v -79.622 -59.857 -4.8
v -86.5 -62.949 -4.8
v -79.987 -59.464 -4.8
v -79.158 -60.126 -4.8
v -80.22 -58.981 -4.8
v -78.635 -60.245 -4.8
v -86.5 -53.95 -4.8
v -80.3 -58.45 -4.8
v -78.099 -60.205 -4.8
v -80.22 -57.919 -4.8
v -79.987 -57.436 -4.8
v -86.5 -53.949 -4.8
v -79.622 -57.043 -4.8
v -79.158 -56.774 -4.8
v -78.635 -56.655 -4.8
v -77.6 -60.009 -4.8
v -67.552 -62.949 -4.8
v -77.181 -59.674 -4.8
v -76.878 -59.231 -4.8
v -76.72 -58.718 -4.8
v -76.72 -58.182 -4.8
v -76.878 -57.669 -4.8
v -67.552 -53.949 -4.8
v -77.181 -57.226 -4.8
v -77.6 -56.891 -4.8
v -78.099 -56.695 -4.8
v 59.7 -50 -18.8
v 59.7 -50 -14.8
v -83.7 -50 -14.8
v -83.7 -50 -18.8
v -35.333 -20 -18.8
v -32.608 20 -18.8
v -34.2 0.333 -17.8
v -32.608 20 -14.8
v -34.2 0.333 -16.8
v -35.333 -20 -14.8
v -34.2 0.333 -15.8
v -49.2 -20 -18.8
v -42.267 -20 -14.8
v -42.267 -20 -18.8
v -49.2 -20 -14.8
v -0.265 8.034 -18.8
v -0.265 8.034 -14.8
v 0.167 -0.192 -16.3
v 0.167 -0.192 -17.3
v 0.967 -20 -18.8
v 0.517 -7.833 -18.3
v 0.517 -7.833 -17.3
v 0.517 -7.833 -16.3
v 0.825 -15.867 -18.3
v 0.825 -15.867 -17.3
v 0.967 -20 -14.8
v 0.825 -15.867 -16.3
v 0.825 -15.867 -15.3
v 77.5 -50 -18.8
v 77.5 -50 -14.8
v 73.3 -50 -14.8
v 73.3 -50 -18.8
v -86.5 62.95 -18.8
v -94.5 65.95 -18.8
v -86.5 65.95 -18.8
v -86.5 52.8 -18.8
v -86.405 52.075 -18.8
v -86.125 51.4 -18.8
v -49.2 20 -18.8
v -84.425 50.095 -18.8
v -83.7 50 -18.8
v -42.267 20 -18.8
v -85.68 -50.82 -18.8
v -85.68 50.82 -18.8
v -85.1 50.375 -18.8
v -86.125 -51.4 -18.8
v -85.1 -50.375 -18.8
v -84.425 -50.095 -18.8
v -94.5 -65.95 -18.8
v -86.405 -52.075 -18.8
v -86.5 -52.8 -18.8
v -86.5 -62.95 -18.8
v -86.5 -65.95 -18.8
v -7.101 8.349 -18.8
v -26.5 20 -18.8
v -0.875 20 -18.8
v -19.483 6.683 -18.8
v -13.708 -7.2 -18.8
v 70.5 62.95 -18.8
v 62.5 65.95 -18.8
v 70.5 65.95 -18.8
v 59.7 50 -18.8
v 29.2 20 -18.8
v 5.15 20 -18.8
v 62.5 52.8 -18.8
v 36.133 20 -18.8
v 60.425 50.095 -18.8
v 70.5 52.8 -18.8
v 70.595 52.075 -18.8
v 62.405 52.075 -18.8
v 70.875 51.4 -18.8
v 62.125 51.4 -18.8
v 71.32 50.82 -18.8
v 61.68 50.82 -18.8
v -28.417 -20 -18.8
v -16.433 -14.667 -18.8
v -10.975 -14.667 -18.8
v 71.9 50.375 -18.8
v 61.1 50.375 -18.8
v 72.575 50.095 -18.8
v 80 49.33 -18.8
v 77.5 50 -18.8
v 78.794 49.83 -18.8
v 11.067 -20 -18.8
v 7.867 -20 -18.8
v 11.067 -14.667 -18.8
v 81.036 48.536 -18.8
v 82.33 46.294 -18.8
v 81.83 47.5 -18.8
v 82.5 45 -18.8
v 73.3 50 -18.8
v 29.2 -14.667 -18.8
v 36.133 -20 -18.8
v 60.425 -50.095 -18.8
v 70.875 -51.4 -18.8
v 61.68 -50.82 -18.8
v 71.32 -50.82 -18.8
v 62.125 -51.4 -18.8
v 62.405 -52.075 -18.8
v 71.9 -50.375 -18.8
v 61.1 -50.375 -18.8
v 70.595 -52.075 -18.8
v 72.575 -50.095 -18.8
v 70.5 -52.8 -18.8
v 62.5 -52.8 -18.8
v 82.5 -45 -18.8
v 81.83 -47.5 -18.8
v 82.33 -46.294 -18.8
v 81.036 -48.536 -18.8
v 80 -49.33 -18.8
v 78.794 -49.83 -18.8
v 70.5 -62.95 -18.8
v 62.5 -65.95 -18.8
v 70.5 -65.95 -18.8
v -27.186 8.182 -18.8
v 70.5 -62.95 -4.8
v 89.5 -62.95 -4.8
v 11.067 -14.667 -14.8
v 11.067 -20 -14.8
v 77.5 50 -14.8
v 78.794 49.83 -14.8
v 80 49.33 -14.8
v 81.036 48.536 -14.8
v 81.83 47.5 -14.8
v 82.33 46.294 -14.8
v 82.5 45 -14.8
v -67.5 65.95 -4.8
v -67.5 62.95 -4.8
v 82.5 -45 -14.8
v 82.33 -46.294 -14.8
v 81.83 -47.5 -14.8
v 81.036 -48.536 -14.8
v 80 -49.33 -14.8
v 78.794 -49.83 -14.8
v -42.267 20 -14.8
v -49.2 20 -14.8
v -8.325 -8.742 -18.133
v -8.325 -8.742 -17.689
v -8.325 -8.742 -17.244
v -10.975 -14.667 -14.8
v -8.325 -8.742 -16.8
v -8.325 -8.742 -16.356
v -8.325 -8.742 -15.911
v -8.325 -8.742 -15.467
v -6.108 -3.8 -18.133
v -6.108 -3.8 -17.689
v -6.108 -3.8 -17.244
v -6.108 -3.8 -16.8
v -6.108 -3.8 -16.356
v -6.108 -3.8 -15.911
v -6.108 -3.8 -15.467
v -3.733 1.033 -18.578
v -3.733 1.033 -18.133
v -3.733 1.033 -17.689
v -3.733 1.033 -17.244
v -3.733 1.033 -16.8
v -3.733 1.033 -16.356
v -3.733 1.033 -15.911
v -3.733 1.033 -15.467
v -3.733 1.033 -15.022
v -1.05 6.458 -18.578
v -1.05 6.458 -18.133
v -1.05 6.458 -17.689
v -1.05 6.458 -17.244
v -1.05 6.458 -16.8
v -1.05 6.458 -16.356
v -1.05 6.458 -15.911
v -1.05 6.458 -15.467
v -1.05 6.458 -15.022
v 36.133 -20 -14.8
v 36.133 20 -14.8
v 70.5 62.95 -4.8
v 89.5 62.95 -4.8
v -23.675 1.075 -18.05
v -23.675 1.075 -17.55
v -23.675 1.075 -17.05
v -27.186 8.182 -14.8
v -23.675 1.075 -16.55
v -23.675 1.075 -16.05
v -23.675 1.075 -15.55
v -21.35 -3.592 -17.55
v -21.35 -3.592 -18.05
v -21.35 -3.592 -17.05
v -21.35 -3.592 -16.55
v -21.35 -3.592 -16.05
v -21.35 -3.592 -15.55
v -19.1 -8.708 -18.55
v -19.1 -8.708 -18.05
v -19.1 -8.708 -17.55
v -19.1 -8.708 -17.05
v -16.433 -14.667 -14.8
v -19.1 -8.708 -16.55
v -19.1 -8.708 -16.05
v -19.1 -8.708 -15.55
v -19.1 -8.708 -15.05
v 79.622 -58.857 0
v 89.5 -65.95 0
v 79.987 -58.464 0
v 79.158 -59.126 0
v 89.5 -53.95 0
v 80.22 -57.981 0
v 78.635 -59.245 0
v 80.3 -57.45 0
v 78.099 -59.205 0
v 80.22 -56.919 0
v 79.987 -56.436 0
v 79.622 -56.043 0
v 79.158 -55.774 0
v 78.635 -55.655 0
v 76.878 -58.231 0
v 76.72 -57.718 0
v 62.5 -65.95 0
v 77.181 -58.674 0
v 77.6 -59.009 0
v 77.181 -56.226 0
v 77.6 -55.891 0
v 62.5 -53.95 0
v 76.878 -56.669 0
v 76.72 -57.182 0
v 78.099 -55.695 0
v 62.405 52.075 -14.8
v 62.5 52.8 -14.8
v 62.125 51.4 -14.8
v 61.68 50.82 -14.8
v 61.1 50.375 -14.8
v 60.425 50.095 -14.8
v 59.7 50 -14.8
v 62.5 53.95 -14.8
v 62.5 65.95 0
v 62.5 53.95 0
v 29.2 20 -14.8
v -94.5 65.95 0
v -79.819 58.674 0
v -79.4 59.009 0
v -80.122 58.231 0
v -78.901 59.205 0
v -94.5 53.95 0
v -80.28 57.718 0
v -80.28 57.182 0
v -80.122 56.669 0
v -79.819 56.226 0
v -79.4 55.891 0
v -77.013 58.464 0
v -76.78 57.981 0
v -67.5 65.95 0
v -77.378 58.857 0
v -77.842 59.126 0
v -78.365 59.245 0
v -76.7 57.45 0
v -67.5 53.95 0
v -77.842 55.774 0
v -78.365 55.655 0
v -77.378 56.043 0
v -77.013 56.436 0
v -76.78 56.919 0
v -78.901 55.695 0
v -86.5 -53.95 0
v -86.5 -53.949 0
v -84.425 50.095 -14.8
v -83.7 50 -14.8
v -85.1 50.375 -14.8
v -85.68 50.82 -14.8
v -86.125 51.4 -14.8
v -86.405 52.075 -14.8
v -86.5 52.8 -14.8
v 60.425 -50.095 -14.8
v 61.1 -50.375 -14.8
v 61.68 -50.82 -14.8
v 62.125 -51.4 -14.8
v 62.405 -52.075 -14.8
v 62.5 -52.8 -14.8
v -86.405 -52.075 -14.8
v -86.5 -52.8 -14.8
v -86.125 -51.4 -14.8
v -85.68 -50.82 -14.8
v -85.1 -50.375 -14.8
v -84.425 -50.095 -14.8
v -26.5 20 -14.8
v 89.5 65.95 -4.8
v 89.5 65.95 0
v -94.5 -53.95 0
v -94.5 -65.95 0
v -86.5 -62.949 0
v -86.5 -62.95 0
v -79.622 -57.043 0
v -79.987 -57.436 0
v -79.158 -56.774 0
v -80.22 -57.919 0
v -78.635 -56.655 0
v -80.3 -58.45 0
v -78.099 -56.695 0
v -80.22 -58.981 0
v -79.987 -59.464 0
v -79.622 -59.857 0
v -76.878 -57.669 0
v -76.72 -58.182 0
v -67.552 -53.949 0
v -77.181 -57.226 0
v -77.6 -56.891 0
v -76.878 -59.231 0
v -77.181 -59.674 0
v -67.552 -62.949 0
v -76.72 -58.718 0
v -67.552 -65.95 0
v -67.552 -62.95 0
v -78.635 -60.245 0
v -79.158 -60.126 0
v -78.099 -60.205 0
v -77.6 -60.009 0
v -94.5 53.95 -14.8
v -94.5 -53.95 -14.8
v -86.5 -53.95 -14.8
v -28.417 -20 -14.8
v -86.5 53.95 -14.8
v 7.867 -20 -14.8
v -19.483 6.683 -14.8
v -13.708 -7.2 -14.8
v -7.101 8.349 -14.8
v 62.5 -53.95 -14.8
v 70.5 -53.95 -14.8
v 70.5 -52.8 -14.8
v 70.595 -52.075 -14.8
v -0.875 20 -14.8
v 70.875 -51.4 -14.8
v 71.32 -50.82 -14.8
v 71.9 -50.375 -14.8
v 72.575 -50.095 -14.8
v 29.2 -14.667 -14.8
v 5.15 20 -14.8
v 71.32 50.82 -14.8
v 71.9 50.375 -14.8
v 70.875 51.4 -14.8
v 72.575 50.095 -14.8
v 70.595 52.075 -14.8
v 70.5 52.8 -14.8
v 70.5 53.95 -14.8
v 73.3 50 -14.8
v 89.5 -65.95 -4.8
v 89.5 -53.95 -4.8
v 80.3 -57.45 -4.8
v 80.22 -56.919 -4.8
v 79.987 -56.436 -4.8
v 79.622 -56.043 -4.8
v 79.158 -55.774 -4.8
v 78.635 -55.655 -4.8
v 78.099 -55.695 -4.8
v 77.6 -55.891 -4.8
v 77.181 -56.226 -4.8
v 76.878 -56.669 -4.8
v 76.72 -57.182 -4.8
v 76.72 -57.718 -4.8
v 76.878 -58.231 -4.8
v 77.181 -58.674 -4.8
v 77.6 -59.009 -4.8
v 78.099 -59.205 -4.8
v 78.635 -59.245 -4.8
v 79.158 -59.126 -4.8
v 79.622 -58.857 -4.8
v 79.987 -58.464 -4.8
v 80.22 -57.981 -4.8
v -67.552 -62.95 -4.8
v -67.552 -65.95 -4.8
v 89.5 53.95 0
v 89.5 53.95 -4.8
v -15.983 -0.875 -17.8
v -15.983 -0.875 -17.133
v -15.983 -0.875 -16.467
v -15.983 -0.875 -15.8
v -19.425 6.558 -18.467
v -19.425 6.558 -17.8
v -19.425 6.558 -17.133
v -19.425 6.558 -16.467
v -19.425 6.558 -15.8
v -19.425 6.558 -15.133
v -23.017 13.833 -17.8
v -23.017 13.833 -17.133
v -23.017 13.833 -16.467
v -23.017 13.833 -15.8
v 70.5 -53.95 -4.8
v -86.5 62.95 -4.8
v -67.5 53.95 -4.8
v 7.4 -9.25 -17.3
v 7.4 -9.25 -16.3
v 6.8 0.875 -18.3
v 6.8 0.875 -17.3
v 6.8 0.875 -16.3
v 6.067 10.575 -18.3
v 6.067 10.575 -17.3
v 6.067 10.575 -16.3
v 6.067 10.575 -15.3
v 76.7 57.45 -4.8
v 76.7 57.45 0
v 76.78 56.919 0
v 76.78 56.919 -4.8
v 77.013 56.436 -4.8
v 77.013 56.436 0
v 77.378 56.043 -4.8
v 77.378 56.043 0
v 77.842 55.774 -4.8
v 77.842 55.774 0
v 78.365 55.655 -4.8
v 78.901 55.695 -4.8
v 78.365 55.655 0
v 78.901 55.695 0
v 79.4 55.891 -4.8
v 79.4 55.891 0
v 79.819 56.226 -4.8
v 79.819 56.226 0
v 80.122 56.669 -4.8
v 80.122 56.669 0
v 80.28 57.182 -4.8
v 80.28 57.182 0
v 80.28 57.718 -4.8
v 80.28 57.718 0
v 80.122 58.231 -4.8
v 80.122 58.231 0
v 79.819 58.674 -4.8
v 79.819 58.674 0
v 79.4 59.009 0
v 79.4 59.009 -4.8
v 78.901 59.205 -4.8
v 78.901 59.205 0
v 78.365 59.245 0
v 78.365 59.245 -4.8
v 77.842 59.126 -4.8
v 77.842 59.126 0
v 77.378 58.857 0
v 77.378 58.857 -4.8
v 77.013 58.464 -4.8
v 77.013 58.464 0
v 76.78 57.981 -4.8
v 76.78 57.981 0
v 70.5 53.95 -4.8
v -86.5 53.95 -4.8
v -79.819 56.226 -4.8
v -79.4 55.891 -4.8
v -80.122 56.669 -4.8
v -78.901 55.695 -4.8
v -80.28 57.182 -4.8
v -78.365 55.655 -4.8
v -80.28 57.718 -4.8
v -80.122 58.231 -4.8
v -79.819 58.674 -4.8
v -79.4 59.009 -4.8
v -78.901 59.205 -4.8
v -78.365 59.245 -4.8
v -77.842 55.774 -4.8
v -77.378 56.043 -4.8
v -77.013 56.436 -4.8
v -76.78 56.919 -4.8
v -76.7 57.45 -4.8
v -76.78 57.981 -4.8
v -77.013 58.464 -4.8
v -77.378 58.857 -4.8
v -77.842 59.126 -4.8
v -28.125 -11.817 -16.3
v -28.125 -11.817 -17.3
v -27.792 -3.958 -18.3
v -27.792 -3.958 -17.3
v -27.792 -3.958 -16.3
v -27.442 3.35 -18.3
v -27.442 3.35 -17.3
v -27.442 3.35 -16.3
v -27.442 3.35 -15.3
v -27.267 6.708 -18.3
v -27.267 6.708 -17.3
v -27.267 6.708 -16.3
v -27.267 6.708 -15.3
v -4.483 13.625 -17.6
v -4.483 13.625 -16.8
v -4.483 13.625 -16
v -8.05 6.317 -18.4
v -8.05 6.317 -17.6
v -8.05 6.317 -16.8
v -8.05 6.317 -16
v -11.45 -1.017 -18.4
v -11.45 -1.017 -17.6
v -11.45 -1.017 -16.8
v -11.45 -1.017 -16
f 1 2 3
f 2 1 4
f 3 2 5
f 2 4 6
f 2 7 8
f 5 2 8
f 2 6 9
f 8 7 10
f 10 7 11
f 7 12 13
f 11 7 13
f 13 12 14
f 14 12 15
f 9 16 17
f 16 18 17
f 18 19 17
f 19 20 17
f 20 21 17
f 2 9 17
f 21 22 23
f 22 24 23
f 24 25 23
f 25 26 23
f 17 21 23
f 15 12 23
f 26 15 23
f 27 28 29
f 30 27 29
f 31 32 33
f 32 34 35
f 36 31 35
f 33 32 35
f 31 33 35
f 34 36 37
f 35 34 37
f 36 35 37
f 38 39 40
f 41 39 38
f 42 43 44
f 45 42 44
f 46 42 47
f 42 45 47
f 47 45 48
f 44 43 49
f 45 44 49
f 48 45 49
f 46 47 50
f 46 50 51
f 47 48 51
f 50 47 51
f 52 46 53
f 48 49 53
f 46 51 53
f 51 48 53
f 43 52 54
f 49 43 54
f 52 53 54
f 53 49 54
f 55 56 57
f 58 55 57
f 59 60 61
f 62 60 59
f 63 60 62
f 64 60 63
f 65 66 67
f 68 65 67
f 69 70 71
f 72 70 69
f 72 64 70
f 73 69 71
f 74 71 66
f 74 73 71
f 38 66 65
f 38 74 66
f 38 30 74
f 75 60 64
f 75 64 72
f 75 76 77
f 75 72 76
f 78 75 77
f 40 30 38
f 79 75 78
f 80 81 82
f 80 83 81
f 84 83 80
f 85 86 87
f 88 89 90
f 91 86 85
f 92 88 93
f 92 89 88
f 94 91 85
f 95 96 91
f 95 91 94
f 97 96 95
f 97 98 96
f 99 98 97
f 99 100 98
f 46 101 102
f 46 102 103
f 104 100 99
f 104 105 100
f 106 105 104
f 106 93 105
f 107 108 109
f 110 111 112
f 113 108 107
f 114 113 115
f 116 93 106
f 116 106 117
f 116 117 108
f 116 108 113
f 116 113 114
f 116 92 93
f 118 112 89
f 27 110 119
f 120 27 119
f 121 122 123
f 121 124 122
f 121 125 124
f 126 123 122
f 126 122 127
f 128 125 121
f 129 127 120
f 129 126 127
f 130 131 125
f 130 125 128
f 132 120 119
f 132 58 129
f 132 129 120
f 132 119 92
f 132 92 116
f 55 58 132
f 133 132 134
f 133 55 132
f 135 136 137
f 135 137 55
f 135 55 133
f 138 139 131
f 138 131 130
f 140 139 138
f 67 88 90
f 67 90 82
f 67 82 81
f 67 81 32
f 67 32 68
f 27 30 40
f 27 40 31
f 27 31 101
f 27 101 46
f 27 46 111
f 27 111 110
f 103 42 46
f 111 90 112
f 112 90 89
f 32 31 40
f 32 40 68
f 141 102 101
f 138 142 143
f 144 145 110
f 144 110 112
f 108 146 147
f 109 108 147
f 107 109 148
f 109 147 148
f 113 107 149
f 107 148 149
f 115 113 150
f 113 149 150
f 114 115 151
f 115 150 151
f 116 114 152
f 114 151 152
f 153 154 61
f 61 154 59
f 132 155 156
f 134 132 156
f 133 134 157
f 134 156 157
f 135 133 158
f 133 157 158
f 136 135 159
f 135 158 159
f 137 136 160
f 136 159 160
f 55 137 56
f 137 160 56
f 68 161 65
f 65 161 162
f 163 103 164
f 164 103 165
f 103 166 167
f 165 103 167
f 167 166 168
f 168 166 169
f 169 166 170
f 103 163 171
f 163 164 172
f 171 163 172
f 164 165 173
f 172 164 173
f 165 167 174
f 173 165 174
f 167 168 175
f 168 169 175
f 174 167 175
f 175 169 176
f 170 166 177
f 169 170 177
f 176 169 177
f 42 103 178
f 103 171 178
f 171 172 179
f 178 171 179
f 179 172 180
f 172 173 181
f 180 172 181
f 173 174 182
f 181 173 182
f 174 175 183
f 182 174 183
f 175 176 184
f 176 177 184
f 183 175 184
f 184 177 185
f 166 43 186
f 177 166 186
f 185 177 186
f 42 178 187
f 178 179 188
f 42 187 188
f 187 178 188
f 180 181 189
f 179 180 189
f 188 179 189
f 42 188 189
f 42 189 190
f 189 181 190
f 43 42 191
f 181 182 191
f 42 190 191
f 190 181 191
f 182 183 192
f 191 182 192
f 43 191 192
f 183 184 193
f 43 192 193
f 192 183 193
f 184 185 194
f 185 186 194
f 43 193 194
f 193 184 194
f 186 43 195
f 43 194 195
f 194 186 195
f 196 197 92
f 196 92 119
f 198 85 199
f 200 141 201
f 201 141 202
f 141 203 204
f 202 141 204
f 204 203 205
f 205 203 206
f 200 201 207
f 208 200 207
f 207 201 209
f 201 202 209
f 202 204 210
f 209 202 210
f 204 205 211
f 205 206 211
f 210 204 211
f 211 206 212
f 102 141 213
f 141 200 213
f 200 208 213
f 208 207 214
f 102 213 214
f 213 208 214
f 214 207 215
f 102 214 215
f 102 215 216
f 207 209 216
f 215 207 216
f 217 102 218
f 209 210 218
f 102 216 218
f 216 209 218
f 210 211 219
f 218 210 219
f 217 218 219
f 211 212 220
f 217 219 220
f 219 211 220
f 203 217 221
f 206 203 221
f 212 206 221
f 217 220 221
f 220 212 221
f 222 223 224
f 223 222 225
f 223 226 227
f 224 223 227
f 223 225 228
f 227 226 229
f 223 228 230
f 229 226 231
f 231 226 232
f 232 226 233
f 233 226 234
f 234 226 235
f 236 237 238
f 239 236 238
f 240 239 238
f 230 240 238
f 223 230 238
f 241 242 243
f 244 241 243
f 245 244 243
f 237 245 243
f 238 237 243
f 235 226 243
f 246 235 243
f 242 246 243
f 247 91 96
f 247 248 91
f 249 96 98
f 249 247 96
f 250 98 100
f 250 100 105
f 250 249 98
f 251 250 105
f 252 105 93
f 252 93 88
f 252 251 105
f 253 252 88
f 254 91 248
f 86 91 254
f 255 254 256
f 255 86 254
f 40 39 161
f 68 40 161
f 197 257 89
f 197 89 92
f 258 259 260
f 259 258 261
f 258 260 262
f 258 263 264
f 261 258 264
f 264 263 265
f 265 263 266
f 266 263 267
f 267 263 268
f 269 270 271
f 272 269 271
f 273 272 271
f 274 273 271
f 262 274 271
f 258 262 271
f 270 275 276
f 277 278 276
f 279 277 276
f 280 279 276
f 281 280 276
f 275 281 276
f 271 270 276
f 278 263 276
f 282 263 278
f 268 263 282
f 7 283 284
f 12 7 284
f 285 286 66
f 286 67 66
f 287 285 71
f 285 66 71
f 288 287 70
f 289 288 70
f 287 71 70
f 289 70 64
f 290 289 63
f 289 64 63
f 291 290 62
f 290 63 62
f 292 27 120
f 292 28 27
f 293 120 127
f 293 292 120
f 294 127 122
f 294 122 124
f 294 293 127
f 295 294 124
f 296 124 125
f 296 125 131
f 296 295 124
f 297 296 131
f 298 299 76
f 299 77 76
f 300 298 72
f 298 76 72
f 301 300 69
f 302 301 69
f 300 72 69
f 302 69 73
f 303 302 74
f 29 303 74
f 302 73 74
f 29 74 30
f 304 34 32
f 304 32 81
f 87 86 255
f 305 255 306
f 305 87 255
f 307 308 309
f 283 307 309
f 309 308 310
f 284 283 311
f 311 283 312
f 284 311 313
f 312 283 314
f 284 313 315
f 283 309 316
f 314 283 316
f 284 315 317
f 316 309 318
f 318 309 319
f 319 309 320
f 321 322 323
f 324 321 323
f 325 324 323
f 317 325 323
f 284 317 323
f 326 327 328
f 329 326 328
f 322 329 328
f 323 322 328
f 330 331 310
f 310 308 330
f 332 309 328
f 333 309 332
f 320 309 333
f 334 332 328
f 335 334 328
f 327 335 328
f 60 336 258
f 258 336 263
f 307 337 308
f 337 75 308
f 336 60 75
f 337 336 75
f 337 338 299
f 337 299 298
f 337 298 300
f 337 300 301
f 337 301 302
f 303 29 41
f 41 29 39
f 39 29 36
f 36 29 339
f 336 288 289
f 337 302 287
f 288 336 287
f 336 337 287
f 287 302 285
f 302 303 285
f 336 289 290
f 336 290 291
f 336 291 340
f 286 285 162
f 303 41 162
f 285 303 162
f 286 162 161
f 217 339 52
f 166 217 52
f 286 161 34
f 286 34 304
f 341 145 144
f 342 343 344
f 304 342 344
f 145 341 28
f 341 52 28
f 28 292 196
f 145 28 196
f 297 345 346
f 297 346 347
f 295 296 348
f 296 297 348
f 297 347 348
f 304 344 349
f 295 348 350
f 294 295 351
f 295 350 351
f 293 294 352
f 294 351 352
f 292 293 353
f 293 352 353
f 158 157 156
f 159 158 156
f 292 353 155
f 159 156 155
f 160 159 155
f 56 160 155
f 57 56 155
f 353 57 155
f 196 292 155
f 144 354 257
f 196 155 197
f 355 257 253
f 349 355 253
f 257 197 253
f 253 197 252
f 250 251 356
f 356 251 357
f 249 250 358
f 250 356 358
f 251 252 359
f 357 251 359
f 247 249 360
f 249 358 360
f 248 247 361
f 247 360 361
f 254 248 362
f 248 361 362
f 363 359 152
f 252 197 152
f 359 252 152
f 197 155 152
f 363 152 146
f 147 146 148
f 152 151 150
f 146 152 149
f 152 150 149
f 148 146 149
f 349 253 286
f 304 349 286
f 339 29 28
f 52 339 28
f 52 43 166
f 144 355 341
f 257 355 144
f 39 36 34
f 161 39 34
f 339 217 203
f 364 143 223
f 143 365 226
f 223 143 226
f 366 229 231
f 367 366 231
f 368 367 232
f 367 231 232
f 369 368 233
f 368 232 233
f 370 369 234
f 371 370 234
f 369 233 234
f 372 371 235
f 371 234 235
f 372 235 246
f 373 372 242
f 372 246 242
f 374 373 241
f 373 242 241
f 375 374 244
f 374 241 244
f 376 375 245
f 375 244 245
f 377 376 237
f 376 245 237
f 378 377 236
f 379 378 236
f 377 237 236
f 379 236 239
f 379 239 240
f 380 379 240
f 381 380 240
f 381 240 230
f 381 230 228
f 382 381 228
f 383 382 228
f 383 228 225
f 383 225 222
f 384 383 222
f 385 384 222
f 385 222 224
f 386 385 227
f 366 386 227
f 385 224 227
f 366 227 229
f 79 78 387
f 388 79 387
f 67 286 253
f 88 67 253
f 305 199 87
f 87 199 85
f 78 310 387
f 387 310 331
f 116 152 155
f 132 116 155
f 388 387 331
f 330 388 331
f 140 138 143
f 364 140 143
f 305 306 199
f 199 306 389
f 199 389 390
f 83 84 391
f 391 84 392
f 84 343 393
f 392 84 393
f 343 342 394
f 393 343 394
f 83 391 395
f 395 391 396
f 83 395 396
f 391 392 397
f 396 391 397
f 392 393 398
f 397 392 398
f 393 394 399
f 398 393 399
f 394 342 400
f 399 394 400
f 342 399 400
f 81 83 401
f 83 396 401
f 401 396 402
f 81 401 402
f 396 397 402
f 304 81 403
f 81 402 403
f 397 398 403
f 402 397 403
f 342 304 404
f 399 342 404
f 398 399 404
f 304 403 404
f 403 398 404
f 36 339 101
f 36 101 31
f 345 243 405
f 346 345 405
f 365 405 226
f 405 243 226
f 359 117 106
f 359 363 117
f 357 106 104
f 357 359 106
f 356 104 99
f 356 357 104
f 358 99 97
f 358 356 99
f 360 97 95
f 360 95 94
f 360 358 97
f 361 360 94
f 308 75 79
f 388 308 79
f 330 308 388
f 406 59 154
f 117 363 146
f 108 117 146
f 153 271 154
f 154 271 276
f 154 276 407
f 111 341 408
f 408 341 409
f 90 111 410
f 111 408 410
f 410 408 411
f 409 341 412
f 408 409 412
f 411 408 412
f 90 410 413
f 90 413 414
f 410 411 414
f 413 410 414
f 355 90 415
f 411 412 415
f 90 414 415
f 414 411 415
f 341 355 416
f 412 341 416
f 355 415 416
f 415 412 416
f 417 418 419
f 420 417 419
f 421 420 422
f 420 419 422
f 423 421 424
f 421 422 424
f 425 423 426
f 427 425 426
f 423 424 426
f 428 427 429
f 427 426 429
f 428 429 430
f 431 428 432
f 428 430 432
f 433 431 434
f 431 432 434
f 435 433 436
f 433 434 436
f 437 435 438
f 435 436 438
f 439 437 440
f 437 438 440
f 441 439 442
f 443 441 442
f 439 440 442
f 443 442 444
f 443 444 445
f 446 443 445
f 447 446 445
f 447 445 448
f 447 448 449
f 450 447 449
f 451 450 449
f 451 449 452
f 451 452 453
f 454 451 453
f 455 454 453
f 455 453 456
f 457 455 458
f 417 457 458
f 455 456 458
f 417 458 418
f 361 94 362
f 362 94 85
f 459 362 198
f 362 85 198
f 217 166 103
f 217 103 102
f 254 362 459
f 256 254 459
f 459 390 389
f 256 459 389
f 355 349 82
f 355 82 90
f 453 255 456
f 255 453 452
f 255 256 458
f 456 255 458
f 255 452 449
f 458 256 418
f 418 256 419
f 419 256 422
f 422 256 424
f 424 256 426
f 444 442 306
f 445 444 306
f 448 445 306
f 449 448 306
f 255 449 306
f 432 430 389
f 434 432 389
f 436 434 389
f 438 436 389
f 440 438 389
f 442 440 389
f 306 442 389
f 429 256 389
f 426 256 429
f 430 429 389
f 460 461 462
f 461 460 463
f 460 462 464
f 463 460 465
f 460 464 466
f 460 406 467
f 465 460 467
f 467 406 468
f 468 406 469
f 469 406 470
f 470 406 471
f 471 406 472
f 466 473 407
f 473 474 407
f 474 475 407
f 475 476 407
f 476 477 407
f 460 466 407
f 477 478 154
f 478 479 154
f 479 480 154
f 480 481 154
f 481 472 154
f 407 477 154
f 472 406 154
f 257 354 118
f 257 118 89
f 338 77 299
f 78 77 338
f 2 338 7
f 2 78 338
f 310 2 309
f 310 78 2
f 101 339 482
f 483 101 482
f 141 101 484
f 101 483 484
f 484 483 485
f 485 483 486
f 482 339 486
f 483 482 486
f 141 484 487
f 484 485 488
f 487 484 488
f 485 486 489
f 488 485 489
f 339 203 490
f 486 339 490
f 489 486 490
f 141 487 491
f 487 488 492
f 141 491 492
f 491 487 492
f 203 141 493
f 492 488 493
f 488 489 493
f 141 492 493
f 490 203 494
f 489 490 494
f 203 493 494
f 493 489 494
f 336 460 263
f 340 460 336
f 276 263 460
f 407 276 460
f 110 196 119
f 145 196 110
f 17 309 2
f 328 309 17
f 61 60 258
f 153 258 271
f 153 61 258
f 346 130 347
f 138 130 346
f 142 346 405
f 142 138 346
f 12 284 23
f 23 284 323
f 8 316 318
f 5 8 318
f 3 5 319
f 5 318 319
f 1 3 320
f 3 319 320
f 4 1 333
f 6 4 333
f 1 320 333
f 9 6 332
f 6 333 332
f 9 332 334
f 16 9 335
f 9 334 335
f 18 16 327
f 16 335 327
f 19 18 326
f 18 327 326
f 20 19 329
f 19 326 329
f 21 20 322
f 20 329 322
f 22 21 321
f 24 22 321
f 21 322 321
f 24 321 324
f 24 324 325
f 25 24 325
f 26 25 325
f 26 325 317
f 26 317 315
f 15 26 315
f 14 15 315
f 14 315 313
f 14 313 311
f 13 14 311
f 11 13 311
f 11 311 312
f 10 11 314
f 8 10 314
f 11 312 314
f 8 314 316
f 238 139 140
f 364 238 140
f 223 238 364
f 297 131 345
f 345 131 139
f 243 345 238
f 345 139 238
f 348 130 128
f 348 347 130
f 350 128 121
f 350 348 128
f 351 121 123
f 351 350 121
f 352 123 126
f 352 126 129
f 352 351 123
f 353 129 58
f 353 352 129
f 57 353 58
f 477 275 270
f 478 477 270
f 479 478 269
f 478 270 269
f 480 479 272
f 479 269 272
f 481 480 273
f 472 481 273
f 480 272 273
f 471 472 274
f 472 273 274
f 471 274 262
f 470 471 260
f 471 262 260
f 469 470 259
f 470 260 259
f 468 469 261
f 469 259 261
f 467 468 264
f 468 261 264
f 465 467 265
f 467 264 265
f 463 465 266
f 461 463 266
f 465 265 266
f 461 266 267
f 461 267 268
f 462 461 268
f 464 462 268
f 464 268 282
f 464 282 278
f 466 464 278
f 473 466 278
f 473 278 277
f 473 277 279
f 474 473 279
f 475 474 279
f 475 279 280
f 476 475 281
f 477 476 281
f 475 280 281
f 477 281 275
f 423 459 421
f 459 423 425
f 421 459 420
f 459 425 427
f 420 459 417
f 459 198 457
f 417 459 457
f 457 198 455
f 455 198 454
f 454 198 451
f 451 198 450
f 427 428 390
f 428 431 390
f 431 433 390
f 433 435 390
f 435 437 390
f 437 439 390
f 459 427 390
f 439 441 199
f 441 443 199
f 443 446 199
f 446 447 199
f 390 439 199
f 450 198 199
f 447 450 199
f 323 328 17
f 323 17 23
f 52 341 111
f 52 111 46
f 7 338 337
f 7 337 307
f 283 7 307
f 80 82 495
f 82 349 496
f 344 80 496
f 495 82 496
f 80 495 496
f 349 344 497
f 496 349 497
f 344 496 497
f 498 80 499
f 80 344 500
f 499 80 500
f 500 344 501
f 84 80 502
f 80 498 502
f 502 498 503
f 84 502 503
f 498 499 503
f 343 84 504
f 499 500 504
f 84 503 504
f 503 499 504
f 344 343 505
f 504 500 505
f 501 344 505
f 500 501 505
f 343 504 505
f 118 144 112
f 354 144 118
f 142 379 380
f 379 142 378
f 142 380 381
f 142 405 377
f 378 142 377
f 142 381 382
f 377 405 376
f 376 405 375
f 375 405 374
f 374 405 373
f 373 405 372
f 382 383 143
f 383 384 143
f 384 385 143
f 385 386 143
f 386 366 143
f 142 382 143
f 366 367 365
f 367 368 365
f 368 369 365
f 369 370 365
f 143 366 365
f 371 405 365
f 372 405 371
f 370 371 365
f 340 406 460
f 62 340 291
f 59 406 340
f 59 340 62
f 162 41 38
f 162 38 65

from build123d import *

# Parameters (mm, degrees)
SKETCH1_W              = 19
SKETCH1_H              = 9
SKETCH1_R              = 1.8
BOSS_EXTRUDE1_DEPTH    = 4.8
BOSS_EXTRUDE1_2_DEPTH  = 4.8
BOSS_EXTRUDE1_3_DEPTH  = 4.8
SKETCH1_W_2            = 18.947549714
BOSS_EXTRUDE1_4_DEPTH  = 4.8
BOSS_EXTRUDE2_DEPTH    = 4
BOSS_EXTRUDE3_DEPTH    = 8
BOSS_EXTRUDE4_DEPTH    = 8
FILLET1_R              = 2.8
SKETCH11_W             = 19
SKETCH11_H             = 4.8
BOSS_EXTRUDE5_DEPTH    = 3
BOSS_EXTRUDE6_DEPTH    = 3
LPATTERN1_COUNT        = 2
LPATTERN1_PITCH        = 157
CUT_EXTRUDE2_START     = -4
CUT_EXTRUDE2_OUTLINE_W = 6.933333333
CUT_EXTRUDE2_OUTLINE_H = 40
CUT_EXTRUDE2_DEPTH     = 4
SKETCH12_W             = 19
SKETCH12_H             = 4.8
BOSS_EXTRUDE7_DEPTH    = 3
SKETCH12_4_W           = 8
SKETCH12_4_H           = 18.8
BOSS_EXTRUDE9_DEPTH    = 3


# Read off the part's stored shape, not the designer's step: Cut-Extrude2
with BuildPart() as part:
    # Sketch1 → Boss-Extrude1 (new body)
    with BuildSketch(Plane.XY):
        with Locations((80, 58.45)):
            Rectangle(SKETCH1_W, SKETCH1_H)
        with Locations(Location((78.5, 57.45, 0), (0, 0, 180))):
            Circle(SKETCH1_R, mode=Mode.SUBTRACT)
    extrude(amount=-BOSS_EXTRUDE1_DEPTH)



with BuildPart() as body_2:
    # Sketch1 → Boss-Extrude1 2 (new body)
    with BuildSketch(Plane.XY):
        with Locations((80, -58.45)):
            Rectangle(SKETCH1_W, SKETCH1_H)
        with Locations((78.5, -57.45)):
            Circle(SKETCH1_R, mode=Mode.SUBTRACT)
    extrude(amount=-BOSS_EXTRUDE1_2_DEPTH)

    # Sketch12 → Boss-Extrude7 (add)
    with BuildSketch(Plane.XZ.offset(62.95)):
        Polygon((70.5, -4.8), (70.5, 0), (62.5, 0), (62.5, -18.8), (70.5, -18.8), align=None)
        Polygon((70.5, -18.8), (89.5, -4.8), (70.5, -4.8), align=None)
        with Locations((80, -2.4)):
            Rectangle(SKETCH12_W, SKETCH12_H)
        Polygon((-86.5, -18.8), (-67.552450286, -4.8), (-67.552450286, 0), (-94.5, 0), (-94.5, -18.8), align=None)
    extrude(amount=BOSS_EXTRUDE7_DEPTH)


with BuildPart() as body_3:
    # Sketch1 → Boss-Extrude1 3 (new body)
    with BuildSketch(Plane.XY):
        with Locations((-77, 58.45)):
            Rectangle(SKETCH1_W, SKETCH1_H)
        with Locations((-78.5, 57.45)):
            Circle(SKETCH1_R, mode=Mode.SUBTRACT)
    extrude(amount=-BOSS_EXTRUDE1_3_DEPTH)


with BuildPart() as body_4:
    # Sketch1 → Boss-Extrude1 4 (new body)
    with BuildSketch(Plane.XY):
        with Locations((-77.026225143, -58.448744181)):
            Rectangle(SKETCH1_W_2, SKETCH1_H)
        with Locations(Location((-78.5, -58.45, 0), (0, 0, 180))):
            Circle(SKETCH1_R, mode=Mode.SUBTRACT)
    extrude(amount=-BOSS_EXTRUDE1_4_DEPTH)


with BuildPart() as body_5:
    # Sketch3 → Boss-Extrude2 (new body)
    with BuildSketch(Plane(origin=(0, 0, -14.8), x_dir=(-1, 0, 0), z_dir=(0, 0, -1))):
        with BuildLine():
            Line((-77.5, -50), (82.5, -50))
            Line((82.5, -50), (86.5, -50))
            Line((86.5, -50), (86.5, 50))
            Line((86.5, 50), (82.5, 50))
            Line((82.5, 50), (-77.5, 50))
            ThreePointArc((-77.5, 50), (-81.035533906, 48.535533906), (-82.5, 45))
            Line((-82.5, 45), (-82.5, -45))
            ThreePointArc((-82.5, -45), (-81.035533906, -48.535533906), (-77.5, -50))
        make_face()
    extrude(amount=BOSS_EXTRUDE2_DEPTH)


with BuildPart() as part_1:
    add(part.part)

    add(body_5.part)  # Boss-Extrude3 merges body 5
    # Sketch4 → Boss-Extrude3 (add)
    with BuildSketch(Plane.ZY.offset(-70.5)):
        Polygon((-18.8, 61.95), (-18.8, 50), (-14.8, 50), (-14.8, 53.95), (0, 53.95), (0, 61.95), align=None)
    boss_extrude3 = extrude(amount=BOSS_EXTRUDE3_DEPTH)

    # Mirror4: Boss-Extrude3 across plane
    add(boss_extrude3.mirror(Plane.ZX))


    add(body_3.part)  # Boss-Extrude4 merges body 3

    add(body_4.part)  # Boss-Extrude4 merges body 4
    # Sketch10 → Boss-Extrude4 (add)
    with BuildSketch(Plane.ZY.offset(86.5)):
        Polygon((-14.8, 50), (-14.8, 26.95), (-14.8, -50), (-14.8, -53.95), (0, -53.95), (0, -61.95), (-18.8, -61.95), (-18.8, -50), (-18.8, 26.95), (-18.8, 50), (-18.8, 61.95), (0, 61.95), (0, 53.95), (-14.8, 53.95), align=None)
    extrude(amount=BOSS_EXTRUDE4_DEPTH)

    # Fillet1
    fillet1_edges = [part_1.edges().sort_by_distance(p)[0] for p in [
        (62.5, 50, -16.8),
        (70.5, 50, -16.8),
        (-86.5, 50, -16.8),
        (62.5, -50, -16.8),
        (-86.5, -50, -16.8),
        (70.5, -50, -16.8),
    ]]
    fillet(fillet1_edges, radius=FILLET1_R)

    # Sketch11 → Boss-Extrude5 (add)
    with BuildSketch(Plane(origin=(0, 62.95, 0), x_dir=(1, 0, 0), z_dir=(0, 1, 0))):
        with Locations((80, 2.4)):
            Rectangle(SKETCH11_W, SKETCH11_H)
        Polygon((89.5, 4.8), (70.5, 18.8), (70.5, 4.8), align=None)
    boss_extrude5 = extrude(amount=BOSS_EXTRUDE5_DEPTH)

    # Sketch11<5> → Boss-Extrude6 (add, symmetric)
    with BuildSketch(Plane(origin=(0, 62.95, 0), x_dir=(1, 0, 0), z_dir=(0, 1, 0))):
        Polygon((62.5, 18.8), (62.5, 0), (70.5, 0), (70.5, 4.8), (70.5, 18.8), align=None)
    boss_extrude6 = extrude(amount=BOSS_EXTRUDE6_DEPTH, both=True)

    # LPattern1: Boss-Extrude5, Boss-Extrude6 ×2
    with Locations(*[(-i * LPATTERN1_PITCH, 0, 0) for i in range(1, LPATTERN1_COUNT)]):
        add(boss_extrude5)
        add(boss_extrude6)

    # Cut-Extrude2 outline → Cut-Extrude2 (cut)
    with BuildSketch(Plane(origin=(0, 0, -18.8), x_dir=(-1, 0, 0), z_dir=(0, 0, -1)).offset(CUT_EXTRUDE2_START)):
        with BuildLine():
            add(Edge.make_bspline(
                [(10.975, -14.666666667), (10.853422825, -14.380277897), (10.602565639, -13.789355455), (10.2019734, -12.881204225), (9.767405766, -11.924663917), (9.307519179, -10.914258143), (8.824913039, -9.84726331), (8.314703241, -8.72434694), (7.79171958, -7.538855775), (7.060810636, -5.888109041), (6.129555226, -3.804410061), (4.927921427, -1.367968701), (3.745344455, 1.001863959), (2.800332488, 2.930787983), (2.085444913, 4.420434389), (1.562508134, 5.460457627), (1.061997748, 6.444961947), (0.646894723, 7.213714992), (0.390028809, 7.741258394), (0.294400491, 7.960576425), (0.265045842, 8.033579646)],
                knots=[0, 0, 0, 0, 0.034500563, 0.071187, 0.110063316, 0.15100446, 0.194290954, 0.239922853, 0.287774458, 0.337971758, 0.440120704, 0.540825287, 0.639182399, 0.733823363, 0.779010204, 0.822402877, 0.862904814, 0.901482229, 0.919254697, 0.927976768, 0.927976768, 0.927976768, 0.927976768], degree=3))
            Line((10.975, -14.666666667), (16.433333333, -14.666666667))
            add(Edge.make_bspline(
                [(27.185837823, 8.182370431), (27.16617885, 8.135201447), (27.077190149, 7.929706006), (26.638721231, 7.048600418), (25.829878755, 5.497567499), (24.783516915, 3.316615567), (23.677292972, 1.061322281), (22.496472017, -1.232864568), (21.307452474, -3.637070323), (20.375347087, -5.74013551), (19.642877201, -7.45328115), (19.114948929, -8.684692719), (18.595469257, -9.83506941), (18.101022183, -10.910308731), (17.641251792, -11.924811954), (17.206280513, -12.881167962), (16.805785724, -13.789363687), (16.554916393, -14.380280585), (16.433333333, -14.666666667)],
                knots=[0.069075624, 0.069075624, 0.069075624, 0.069075624, 0.074722211, 0.093815852, 0.177875914, 0.268118698, 0.361243693, 0.455604817, 0.553401566, 0.65774291, 0.709886229, 0.759408515, 0.805872658, 0.849438848, 0.8902598, 0.929021986, 0.965600721, 1, 1, 1, 1], degree=3))
            add(Edge.make_bspline(
                [(28.416666667, -20), (28.370326707, -18.622190652), (28.278576595, -15.894217539), (28.126835921, -11.841493191), (27.972919305, -7.871719916), (27.793529228, -4.002689262), (27.621652056, -0.271985015), (27.446461619, 3.283575307), (27.301676648, 6.080429142), (27.213112404, 7.691042727), (27.185837823, 8.182370431)],
                knots=[0, 0, 0, 0, 0.138334797, 0.273893922, 0.406956967, 0.536980294, 0.66254851, 0.781713115, 0.894196585, 0.943574943, 0.943574943, 0.943574943, 0.943574943], degree=3))
            Line((28.416666667, -20), (35.333333333, -20))
            add(Edge.make_bspline(
                [(32.608333333, 20), (32.900086832, 16.750700945), (33.488285429, 10.199851855), (34.22240543, 0.281966095), (34.854498798, -9.801801427), (35.172888466, -16.58285171), (35.333333333, -20)],
                knots=[0, 0, 0, 0, 0.244084907, 0.492094869, 0.744053343, 1, 1, 1, 1], degree=3))
            Line((32.608333333, 20), (26.5, 20))
            add(Edge.make_bspline(
                [(13.708333333, -7.2), (13.830007974, -6.723206803), (14.084227403, -5.727024743), (14.60790834, -4.202590997), (15.228118515, -2.563650948), (16.267159704, -0.227490136), (17.691281094, 2.819546572), (19.414993101, 6.558422585), (21.178315261, 10.255040247), (22.694244718, 13.223986219), (23.88002457, 15.483108195), (24.769643789, 17.058555357), (25.620362017, 18.56810669), (26.210964283, 19.529501548), (26.5, 20)],
                knots=[0, 0, 0, 0, 0.048991334, 0.102359448, 0.160419925, 0.223485875, 0.356930682, 0.495438602, 0.633536698, 0.764814667, 0.827438497, 0.887631747, 0.945007934, 1, 1, 1, 1], degree=3))
            add(Edge.make_bspline(
                [(0.875, 20), (1.488654305, 18.979646564), (2.747485512, 16.886525506), (4.528875905, 13.57233268), (6.317629783, 10.03594448), (8.05073889, 6.322134495), (9.762822193, 2.612044415), (11.165454408, -0.380308514), (12.190165242, -2.648246106), (12.811441851, -4.240209855), (13.334558303, -5.740131954), (13.586944811, -6.725888004), (13.708333333, -7.2)],
                knots=[0, 0, 0, 0, 0.118514609, 0.243117155, 0.374451296, 0.51299163, 0.651063123, 0.781216145, 0.842002695, 0.898745008, 0.951300115, 1, 1, 1, 1], degree=3))
            Line((0.875, 20), (-5.15, 20))
            add(Edge.make_bspline(
                [(-7.866666667, -20), (-7.793061043, -18.169390935), (-7.648961945, -14.585573542), (-7.412691767, -9.29864876), (-7.122844657, -4.171204641), (-6.81303939, 0.843509011), (-6.445549688, 5.747929795), (-6.081795853, 10.555682601), (-5.642721893, 15.291472548), (-5.314200688, 18.430872547), (-5.15, 20)],
                knots=[0, 0, 0, 0, 0.137063101, 0.268330979, 0.395915623, 0.521267524, 0.644201892, 0.763852071, 0.881969103, 1, 1, 1, 1], degree=3))
            Line((-7.866666667, -20), (-0.966666667, -20))
            add(Edge.make_bspline(
                [(0.265045842, 8.033579646), (0.240657124, 7.594605286), (0.154028006, 6.039024937), (-0.000810917, 3.297839119), (-0.167059263, -0.255673004), (-0.358502841, -3.988239018), (-0.518551576, -7.860926765), (-0.678215675, -11.835877361), (-0.828073098, -15.891460777), (-0.92018915, -18.622196537), (-0.966666667, -20)],
                knots=[0.061407132, 0.061407132, 0.061407132, 0.061407132, 0.105523386, 0.217741555, 0.336904218, 0.462483689, 0.592771123, 0.725832, 0.861667458, 1, 1, 1, 1], degree=3))
        make_face()
        with Locations((45.733333333, 0)):
            Rectangle(CUT_EXTRUDE2_OUTLINE_W, CUT_EXTRUDE2_OUTLINE_H)
        Polygon((-29.2, 20), (-36.133333333, 20), (-36.133333333, -20), (-11.066666667, -20), (-11.066666667, -14.666666667), (-29.2, -14.666666667), align=None)
    extrude(amount=CUT_EXTRUDE2_DEPTH, mode=Mode.SUBTRACT)



with BuildPart() as boss_extrude7_piece_1:
    # of the separate pieces the step leaves, piece 1, a body of its own (boss_extrude7_pieces)
    add(body_2.part.solids().sort_by_distance((89.5, -53.95, 0))[0])


with BuildPart() as boss_extrude7_piece_2:
    # of the separate pieces the step leaves, piece 2, a body of its own (boss_extrude7_pieces)
    add(body_2.part.solids().sort_by_distance((-86.5, -62.95, -18.8))[0])


with BuildPart() as part_2:
    add(part_1.part)

    add(boss_extrude7_piece_1.part)  # Boss-Extrude9 merges Boss-Extrude7 piece 1

    add(boss_extrude7_piece_2.part)  # Boss-Extrude9 merges Boss-Extrude7 piece 2
    # Sketch12<4> → Boss-Extrude9 (add)
    with BuildSketch(Plane.XZ.offset(62.95)):
        with Locations((-90.5, -9.4)):
            Rectangle(SKETCH12_4_W, SKETCH12_4_H)
        Polygon((70.5, -4.8), (70.5, 0), (62.5, 0), (62.5, -18.8), (70.5, -18.8), align=None)
    extrude(amount=-BOSS_EXTRUDE9_DEPTH)


solid = part_2.part
